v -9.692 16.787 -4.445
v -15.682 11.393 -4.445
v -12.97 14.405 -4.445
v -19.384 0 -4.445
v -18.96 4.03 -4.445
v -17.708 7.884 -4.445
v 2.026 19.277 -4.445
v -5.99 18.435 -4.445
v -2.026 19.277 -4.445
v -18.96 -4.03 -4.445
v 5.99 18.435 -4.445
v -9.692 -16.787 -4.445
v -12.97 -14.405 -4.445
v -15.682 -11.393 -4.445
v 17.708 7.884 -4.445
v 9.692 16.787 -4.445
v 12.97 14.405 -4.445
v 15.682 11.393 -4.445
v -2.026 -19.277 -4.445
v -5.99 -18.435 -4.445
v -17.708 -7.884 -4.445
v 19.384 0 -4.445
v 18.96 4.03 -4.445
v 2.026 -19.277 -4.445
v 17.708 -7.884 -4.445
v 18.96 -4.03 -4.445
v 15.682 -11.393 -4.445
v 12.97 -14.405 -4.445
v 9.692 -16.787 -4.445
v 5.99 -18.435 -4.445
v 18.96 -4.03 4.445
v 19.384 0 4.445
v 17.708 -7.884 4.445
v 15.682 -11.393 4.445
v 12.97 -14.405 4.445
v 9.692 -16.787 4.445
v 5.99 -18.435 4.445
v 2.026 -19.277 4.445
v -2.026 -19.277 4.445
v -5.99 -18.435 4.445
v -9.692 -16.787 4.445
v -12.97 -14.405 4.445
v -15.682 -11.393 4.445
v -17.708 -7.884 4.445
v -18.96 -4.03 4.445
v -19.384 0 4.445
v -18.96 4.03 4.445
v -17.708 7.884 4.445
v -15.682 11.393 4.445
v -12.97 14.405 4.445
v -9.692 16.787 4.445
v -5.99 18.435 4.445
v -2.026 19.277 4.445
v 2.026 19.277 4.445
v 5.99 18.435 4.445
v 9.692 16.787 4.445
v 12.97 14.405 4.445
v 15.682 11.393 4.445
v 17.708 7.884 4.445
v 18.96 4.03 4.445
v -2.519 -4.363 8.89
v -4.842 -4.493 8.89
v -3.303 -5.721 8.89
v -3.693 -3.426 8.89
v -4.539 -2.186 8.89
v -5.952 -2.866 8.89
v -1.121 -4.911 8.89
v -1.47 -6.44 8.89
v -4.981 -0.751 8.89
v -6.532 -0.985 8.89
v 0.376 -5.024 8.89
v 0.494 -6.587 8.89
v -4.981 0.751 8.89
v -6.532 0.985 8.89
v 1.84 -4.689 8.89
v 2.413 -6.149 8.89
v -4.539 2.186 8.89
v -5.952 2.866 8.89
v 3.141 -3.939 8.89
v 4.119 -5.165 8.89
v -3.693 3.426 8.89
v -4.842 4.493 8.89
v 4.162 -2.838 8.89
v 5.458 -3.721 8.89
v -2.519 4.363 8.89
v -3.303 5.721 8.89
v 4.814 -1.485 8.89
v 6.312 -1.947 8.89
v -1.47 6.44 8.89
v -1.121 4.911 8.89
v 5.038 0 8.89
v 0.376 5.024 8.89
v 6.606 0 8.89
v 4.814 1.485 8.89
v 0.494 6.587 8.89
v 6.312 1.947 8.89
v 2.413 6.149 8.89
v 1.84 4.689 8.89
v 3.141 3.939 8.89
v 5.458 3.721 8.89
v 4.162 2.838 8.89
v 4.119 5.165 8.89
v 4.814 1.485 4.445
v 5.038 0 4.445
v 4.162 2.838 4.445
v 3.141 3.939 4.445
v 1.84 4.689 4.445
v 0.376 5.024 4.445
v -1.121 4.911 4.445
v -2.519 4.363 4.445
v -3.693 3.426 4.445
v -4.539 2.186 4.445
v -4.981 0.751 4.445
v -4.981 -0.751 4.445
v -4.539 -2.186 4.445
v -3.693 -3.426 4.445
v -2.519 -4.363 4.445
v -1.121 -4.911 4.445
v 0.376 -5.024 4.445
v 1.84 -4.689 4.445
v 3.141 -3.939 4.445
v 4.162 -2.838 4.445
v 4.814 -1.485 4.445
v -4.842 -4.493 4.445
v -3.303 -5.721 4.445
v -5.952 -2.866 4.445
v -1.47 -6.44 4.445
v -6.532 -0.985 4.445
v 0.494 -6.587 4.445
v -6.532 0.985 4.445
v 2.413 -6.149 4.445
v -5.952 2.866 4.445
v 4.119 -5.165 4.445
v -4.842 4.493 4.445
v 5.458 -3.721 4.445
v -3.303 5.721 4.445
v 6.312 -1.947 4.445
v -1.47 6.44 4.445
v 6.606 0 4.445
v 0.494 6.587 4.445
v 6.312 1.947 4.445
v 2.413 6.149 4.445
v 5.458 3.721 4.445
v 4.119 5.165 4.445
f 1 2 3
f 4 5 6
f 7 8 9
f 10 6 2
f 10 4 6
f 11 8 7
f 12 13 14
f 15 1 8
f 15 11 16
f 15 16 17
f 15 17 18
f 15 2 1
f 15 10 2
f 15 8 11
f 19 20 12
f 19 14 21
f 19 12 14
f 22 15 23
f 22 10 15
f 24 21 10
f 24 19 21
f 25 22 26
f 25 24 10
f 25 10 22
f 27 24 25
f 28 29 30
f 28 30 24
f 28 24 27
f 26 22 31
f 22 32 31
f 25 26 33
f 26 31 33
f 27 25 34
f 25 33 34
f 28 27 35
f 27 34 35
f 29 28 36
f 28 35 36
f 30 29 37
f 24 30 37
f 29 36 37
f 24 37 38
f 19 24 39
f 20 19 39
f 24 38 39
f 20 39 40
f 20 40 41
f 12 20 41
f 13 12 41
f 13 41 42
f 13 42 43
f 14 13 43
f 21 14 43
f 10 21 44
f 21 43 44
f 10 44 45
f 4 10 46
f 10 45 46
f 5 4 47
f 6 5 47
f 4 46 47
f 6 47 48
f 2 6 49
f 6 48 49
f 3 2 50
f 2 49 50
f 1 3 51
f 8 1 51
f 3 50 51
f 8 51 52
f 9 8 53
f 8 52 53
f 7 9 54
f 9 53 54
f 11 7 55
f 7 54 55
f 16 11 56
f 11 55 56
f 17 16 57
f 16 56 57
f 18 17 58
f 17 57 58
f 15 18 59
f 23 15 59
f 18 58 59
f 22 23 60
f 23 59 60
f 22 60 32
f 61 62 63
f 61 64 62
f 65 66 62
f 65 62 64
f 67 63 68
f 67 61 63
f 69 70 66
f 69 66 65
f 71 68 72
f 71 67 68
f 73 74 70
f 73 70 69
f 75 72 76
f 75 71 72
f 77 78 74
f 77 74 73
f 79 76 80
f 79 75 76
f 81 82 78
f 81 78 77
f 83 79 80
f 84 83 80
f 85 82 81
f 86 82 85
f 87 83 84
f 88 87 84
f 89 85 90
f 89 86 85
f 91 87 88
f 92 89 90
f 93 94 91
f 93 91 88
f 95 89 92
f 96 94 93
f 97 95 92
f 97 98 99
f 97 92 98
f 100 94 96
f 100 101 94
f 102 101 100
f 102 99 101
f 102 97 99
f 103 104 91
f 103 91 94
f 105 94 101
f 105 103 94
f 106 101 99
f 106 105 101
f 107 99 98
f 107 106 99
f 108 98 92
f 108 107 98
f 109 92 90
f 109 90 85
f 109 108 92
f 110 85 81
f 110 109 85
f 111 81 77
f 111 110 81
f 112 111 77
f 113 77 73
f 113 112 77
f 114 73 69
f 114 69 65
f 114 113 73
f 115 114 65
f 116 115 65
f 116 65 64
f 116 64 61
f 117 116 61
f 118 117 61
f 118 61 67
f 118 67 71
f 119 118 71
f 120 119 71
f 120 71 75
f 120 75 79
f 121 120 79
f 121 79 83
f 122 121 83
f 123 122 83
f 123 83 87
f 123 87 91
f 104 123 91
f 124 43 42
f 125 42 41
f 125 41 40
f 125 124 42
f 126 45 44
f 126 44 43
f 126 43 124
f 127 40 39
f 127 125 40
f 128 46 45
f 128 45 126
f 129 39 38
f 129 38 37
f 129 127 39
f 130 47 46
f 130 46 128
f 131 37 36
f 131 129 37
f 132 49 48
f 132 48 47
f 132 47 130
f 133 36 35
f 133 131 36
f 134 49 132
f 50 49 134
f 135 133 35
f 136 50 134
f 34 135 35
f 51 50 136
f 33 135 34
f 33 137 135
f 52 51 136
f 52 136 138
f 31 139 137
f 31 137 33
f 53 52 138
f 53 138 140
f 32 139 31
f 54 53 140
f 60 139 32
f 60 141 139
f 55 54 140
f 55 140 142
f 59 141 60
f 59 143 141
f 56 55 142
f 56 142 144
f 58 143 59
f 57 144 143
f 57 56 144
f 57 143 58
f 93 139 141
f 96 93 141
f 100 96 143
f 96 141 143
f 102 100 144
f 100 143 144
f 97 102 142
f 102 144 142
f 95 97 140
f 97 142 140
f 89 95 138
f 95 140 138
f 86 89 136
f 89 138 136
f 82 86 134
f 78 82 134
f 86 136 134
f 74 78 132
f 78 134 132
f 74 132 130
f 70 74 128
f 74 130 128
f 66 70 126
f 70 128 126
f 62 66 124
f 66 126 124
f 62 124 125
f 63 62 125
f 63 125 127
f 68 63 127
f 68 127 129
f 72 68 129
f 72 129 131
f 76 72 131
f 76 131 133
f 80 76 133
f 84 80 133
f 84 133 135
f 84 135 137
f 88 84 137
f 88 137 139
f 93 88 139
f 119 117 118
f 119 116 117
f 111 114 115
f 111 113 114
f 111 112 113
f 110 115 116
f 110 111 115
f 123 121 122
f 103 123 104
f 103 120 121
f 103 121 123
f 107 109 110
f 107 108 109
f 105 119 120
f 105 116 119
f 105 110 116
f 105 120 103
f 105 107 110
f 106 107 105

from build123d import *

# Parameters (mm, degrees)
F3_R      = 6.60593
F3_R_2    = 5.037678
F0_DEPTH  = 8.89
F4_R      = 11.149828
F5_DEPTH  = 2.54
F1_R      = 19.383662
F2_DEPTH  = 4.445
F2_FACE_R = 19.383662
F6_DEPTH  = 4.445


with BuildPart() as f0:
    # F3 (on Top) → F0 (new body)
    with BuildSketch(Plane.XY):
        Circle(F3_R)
        Circle(F3_R_2, mode=Mode.SUBTRACT)
    extrude(amount=F0_DEPTH)

    # F4 (on Top) → F5 (join)
    with BuildSketch(Plane.XY):
        Circle(F4_R)
    extrude(amount=F5_DEPTH)

    # F1 (on Top) → F2 (join)
    with BuildSketch(Plane.XY):
        Circle(F1_R)
    extrude(amount=F2_DEPTH)

    # F2_face (on face) → F6 (join)
    with BuildSketch(Plane(origin=(0, 0, 0), x_dir=(1, 0, 0), z_dir=(0, 0, -1))):
        Circle(F2_FACE_R)
    extrude(amount=F6_DEPTH)


solid = f0.part
